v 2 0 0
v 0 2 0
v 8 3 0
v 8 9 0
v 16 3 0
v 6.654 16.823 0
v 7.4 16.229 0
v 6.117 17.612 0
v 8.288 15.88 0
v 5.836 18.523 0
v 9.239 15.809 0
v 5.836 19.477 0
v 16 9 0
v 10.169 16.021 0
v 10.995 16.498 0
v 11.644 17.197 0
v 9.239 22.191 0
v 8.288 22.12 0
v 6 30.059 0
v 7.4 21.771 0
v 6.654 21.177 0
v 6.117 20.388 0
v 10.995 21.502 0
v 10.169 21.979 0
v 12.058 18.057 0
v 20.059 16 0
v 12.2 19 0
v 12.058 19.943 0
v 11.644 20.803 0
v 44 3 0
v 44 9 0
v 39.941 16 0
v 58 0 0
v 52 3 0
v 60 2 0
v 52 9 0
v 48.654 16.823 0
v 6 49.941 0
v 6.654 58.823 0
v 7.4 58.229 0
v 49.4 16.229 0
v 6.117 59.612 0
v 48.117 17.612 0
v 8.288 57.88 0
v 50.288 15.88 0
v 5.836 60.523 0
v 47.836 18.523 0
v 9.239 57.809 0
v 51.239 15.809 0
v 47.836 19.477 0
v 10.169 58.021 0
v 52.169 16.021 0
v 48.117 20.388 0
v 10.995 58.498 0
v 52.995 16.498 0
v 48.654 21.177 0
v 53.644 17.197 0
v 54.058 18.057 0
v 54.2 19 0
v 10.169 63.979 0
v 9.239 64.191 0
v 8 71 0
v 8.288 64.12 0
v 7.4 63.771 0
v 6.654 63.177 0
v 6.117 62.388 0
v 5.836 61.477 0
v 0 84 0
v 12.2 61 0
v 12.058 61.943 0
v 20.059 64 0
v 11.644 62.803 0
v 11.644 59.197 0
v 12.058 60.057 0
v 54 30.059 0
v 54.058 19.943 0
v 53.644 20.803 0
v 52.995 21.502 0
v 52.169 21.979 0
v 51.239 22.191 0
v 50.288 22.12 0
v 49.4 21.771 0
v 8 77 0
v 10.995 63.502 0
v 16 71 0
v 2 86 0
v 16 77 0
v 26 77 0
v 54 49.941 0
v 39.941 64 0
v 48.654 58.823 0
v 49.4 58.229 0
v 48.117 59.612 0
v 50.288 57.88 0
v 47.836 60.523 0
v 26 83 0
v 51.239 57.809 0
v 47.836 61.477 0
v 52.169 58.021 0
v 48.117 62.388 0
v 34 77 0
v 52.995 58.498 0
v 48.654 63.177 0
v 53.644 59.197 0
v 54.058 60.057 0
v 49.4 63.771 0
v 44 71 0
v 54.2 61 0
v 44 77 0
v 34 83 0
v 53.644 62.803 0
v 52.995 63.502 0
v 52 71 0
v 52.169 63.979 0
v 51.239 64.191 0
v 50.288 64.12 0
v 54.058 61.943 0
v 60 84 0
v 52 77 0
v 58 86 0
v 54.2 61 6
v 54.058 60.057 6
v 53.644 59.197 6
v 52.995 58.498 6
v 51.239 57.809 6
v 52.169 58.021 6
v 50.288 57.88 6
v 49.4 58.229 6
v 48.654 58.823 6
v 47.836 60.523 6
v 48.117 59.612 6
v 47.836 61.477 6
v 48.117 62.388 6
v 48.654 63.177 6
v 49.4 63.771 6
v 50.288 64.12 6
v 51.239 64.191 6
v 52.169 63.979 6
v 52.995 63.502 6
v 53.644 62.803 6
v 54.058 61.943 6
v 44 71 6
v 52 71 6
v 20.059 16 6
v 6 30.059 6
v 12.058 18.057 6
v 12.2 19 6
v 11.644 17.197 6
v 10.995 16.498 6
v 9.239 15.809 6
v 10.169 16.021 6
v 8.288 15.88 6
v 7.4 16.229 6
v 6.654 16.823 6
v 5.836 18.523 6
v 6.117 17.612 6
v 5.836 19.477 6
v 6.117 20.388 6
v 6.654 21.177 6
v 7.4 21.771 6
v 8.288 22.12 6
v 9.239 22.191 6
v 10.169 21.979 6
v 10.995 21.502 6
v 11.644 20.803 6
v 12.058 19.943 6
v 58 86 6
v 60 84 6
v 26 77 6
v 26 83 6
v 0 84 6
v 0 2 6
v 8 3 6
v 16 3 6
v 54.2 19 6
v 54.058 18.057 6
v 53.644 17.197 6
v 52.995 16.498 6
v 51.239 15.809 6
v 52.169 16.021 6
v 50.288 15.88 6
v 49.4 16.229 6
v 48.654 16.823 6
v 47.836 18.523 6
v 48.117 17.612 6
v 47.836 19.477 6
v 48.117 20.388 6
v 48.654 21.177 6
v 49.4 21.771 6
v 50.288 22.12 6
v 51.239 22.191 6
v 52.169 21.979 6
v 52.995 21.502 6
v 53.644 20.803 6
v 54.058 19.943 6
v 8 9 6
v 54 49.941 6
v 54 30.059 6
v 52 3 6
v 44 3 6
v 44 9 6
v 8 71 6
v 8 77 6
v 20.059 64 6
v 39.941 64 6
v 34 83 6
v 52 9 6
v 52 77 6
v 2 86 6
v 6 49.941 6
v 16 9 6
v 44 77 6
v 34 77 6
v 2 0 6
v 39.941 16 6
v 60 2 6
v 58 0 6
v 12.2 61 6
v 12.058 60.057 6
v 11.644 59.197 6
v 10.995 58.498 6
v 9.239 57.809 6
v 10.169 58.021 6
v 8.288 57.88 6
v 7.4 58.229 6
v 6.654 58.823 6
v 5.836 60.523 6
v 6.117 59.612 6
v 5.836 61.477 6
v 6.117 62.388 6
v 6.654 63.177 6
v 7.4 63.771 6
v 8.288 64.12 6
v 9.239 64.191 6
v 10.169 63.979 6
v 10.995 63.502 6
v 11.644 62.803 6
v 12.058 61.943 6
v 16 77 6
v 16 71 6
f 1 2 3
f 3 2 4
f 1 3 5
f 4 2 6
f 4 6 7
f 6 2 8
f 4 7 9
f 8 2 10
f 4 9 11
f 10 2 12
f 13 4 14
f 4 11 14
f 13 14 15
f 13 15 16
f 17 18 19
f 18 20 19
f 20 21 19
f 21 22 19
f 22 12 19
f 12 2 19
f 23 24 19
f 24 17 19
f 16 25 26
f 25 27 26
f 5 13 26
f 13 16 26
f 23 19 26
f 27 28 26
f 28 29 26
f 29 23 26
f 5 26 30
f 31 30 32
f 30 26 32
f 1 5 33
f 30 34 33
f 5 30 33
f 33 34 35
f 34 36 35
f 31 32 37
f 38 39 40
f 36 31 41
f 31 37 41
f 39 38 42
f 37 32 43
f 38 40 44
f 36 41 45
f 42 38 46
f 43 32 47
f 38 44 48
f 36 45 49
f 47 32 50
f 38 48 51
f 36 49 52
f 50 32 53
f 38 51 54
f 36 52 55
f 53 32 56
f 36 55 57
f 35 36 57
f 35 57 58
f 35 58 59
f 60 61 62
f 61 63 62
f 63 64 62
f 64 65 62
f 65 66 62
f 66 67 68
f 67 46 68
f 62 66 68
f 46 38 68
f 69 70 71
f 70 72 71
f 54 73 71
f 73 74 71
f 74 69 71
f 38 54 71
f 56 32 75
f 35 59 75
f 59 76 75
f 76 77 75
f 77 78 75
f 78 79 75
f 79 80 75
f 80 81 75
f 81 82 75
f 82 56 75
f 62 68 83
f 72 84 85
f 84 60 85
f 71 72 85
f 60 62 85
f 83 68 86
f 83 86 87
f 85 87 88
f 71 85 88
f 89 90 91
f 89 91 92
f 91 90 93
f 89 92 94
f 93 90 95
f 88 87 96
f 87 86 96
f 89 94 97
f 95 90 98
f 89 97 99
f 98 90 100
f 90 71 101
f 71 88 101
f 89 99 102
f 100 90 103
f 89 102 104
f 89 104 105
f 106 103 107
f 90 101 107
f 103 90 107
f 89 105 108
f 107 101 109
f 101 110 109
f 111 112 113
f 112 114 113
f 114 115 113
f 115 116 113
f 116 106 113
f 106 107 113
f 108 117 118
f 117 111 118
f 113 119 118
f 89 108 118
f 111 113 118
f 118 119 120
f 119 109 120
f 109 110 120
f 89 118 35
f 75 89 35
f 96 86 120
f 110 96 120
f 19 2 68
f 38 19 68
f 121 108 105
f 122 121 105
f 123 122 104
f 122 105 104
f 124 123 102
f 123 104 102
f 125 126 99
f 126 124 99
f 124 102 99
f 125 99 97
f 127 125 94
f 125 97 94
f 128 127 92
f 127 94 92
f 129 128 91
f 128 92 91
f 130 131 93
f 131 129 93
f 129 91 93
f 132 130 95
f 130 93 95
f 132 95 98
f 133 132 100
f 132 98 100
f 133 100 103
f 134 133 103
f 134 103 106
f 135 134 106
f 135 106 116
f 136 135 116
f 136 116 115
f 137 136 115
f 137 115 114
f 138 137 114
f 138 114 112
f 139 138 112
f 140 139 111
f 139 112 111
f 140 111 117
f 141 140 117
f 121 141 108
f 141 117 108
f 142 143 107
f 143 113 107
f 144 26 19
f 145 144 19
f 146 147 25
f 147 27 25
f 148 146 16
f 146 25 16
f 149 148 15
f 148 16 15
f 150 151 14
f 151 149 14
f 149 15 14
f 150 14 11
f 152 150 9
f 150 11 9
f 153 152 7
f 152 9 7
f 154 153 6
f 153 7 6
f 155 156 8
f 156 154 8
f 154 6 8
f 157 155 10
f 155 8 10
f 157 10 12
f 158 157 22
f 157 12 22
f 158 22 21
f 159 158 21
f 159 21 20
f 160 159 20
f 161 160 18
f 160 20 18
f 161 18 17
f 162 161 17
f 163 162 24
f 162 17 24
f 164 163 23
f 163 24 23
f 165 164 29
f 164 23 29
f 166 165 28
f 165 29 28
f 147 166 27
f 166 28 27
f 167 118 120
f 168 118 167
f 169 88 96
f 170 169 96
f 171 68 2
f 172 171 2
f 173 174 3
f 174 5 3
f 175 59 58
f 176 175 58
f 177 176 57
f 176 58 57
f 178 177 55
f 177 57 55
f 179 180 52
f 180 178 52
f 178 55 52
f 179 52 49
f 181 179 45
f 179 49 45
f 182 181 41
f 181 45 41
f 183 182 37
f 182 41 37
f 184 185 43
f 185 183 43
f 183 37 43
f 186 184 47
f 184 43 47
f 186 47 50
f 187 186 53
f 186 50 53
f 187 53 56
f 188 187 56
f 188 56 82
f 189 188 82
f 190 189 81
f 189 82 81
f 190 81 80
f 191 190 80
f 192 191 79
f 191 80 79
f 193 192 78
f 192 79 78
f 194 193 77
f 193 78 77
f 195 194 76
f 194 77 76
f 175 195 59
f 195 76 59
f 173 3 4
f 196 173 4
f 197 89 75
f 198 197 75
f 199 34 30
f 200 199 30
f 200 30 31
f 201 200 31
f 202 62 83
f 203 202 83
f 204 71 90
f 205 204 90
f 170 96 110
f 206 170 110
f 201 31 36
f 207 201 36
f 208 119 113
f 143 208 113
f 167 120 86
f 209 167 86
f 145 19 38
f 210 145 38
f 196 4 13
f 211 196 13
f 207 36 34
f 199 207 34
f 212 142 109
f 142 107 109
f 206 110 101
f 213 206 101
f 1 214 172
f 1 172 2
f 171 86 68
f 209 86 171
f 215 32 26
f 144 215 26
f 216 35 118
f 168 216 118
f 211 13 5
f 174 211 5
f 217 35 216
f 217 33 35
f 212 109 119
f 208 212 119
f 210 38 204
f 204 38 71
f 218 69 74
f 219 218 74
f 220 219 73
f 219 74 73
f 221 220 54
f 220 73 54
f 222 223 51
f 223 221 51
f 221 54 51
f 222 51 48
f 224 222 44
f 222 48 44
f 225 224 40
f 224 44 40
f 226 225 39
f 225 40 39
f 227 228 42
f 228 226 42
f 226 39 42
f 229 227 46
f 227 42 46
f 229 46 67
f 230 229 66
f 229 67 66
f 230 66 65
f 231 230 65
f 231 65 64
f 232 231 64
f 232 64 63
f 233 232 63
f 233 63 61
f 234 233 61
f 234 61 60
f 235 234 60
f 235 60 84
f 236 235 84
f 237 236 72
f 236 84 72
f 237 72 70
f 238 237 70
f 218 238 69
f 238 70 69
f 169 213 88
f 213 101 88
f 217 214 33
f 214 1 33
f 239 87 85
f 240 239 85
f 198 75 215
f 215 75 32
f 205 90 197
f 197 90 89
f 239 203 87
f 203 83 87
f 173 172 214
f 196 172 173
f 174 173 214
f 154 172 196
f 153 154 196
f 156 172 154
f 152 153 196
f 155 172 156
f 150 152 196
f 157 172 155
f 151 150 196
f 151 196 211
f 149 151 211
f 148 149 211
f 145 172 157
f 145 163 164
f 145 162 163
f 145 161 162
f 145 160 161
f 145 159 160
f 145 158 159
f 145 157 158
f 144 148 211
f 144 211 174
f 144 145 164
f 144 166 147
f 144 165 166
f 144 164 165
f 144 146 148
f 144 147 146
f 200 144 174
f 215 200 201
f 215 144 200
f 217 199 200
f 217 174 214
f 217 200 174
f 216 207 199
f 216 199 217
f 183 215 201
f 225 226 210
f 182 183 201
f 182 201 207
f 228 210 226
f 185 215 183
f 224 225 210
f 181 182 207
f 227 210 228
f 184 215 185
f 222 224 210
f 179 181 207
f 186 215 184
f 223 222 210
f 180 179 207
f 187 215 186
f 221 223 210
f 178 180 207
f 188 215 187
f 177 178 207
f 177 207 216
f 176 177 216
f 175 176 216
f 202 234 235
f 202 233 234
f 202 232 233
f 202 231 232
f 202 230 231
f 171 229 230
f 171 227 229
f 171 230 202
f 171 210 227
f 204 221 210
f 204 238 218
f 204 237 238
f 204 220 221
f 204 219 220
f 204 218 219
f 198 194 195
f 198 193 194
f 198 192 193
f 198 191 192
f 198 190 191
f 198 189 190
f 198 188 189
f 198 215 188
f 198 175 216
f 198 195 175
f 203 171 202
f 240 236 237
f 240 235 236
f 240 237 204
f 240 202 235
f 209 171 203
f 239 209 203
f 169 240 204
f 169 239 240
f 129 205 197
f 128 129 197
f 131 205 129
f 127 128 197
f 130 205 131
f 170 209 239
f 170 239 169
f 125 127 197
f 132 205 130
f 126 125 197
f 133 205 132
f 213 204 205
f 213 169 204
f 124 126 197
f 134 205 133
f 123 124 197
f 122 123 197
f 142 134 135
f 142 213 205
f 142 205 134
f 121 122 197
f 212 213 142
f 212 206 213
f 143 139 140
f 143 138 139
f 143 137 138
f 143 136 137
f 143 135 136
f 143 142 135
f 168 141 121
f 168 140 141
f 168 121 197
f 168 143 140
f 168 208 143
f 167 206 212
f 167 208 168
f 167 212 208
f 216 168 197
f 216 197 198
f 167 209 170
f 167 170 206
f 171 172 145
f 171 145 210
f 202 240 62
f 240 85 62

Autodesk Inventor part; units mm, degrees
ref_plane "YZ Plane" through (0, 0, 0) normal (1, 0, 0) x (0, 1, 0)
ref_plane "XZ Plane" through (0, 0, 0) normal (0, 1, 0) x (-1, 0, 0)
ref_plane "XY Plane" through (0, 0, 0) normal (0, 0, 1) x (1, 0, 0)
sketch "Sketch1" plane through (0, 0, 0) normal (0, 0, 1) x (1, 0, 0)
  line L0 (0, 0) -> (60, 0)
  line L1 (60, 0) -> (60, 86)
  line L2 (60, 86) -> (0, 86)
  line L3 (0, 86) -> (0, 0)
  line L4 (54, 30.0589) -> (39.9411, 16)
  line L5 (39.9411, 16) -> (20.0589, 16)
  line L6 (20.0589, 16) -> (6, 30.0589)
  line L7 (6, 30.0589) -> (6, 49.9411)
  line L8 (6, 49.9411) -> (20.0589, 64)
  line L9 (20.0589, 64) -> (39.9411, 64)
  line L10 (39.9411, 64) -> (54, 49.9411)
  line L11 (54, 49.9411) -> (54, 30.0589)
  line L12 (9, 61) -> (51, 61) construction
  line L13 (51, 61) -> (51, 19) construction
  line L14 (51, 19) -> (9, 19) construction
  line L15 (9, 19) -> (9, 61) construction
  circle A0 centre (9, 61) radius 3.2
  circle A1 centre (9, 19) radius 3.2
  circle A2 centre (51, 19) radius 3.2
  circle A3 centre (51, 61) radius 3.2
  line L16 (8, 9) -> (16, 9)
  line L17 (16, 9) -> (16, 3)
  line L18 (16, 3) -> (8, 3)
  line L19 (8, 3) -> (8, 9)
  line L20 (44, 9) -> (52, 9)
  line L21 (52, 9) -> (52, 3)
  line L22 (52, 3) -> (44, 3)
  line L23 (44, 3) -> (44, 9)
  line L24 (8, 77) -> (16, 77)
  line L25 (16, 77) -> (16, 71)
  line L26 (16, 71) -> (8, 71)
  line L27 (8, 71) -> (8, 77)
  line L28 (44, 77) -> (52, 77)
  line L29 (52, 77) -> (52, 71)
  line L30 (52, 71) -> (44, 71)
  line L31 (44, 71) -> (44, 77)
  line L32 (26, 83) -> (34, 83)
  line L33 (34, 83) -> (34, 77)
  line L34 (34, 77) -> (26, 77)
  line L35 (26, 77) -> (26, 83)
  line L36 (12, 71) -> (12, 9) construction
  point P0 (30, 40)
  point P1 (30, 61)
  point P2 (30, 64)
  point P3 (9, 40)
  point P4 (6, 40)
  point P5 (12, 40)
  point P6 (30, 77)
  dimension "d0" = 42
  dimension "d1" = 42
  dimension "d2" = 48
  dimension "d3" = 6.4
  dimension "d4" = 6.4
  dimension "d5" = 6.4
  dimension "d6" = 6.4
  dimension "d7" = 6
  dimension "d8" = 8
  dimension "d9" = 6
  dimension "d10" = 8
  dimension "d11" = 3
  dimension "d12" = 8
  dimension "d13" = 6
  dimension "d14" = 3
  dimension "d15" = 86
  dimension "d16" = 6
  dimension "d17" = 6
  dimension "d18" = 8
  dimension "d19" = 8
extrude "Extrusion1" add sketch "Sketch1" along normal blind 6
chamfer "Chamfer1" distance 2 angle 45 4 edges at (0, 0, 3) (60, 0, 3) (60, 86, 3) (0, 86, 3)
properties part number "x_iddler_c_mount"
